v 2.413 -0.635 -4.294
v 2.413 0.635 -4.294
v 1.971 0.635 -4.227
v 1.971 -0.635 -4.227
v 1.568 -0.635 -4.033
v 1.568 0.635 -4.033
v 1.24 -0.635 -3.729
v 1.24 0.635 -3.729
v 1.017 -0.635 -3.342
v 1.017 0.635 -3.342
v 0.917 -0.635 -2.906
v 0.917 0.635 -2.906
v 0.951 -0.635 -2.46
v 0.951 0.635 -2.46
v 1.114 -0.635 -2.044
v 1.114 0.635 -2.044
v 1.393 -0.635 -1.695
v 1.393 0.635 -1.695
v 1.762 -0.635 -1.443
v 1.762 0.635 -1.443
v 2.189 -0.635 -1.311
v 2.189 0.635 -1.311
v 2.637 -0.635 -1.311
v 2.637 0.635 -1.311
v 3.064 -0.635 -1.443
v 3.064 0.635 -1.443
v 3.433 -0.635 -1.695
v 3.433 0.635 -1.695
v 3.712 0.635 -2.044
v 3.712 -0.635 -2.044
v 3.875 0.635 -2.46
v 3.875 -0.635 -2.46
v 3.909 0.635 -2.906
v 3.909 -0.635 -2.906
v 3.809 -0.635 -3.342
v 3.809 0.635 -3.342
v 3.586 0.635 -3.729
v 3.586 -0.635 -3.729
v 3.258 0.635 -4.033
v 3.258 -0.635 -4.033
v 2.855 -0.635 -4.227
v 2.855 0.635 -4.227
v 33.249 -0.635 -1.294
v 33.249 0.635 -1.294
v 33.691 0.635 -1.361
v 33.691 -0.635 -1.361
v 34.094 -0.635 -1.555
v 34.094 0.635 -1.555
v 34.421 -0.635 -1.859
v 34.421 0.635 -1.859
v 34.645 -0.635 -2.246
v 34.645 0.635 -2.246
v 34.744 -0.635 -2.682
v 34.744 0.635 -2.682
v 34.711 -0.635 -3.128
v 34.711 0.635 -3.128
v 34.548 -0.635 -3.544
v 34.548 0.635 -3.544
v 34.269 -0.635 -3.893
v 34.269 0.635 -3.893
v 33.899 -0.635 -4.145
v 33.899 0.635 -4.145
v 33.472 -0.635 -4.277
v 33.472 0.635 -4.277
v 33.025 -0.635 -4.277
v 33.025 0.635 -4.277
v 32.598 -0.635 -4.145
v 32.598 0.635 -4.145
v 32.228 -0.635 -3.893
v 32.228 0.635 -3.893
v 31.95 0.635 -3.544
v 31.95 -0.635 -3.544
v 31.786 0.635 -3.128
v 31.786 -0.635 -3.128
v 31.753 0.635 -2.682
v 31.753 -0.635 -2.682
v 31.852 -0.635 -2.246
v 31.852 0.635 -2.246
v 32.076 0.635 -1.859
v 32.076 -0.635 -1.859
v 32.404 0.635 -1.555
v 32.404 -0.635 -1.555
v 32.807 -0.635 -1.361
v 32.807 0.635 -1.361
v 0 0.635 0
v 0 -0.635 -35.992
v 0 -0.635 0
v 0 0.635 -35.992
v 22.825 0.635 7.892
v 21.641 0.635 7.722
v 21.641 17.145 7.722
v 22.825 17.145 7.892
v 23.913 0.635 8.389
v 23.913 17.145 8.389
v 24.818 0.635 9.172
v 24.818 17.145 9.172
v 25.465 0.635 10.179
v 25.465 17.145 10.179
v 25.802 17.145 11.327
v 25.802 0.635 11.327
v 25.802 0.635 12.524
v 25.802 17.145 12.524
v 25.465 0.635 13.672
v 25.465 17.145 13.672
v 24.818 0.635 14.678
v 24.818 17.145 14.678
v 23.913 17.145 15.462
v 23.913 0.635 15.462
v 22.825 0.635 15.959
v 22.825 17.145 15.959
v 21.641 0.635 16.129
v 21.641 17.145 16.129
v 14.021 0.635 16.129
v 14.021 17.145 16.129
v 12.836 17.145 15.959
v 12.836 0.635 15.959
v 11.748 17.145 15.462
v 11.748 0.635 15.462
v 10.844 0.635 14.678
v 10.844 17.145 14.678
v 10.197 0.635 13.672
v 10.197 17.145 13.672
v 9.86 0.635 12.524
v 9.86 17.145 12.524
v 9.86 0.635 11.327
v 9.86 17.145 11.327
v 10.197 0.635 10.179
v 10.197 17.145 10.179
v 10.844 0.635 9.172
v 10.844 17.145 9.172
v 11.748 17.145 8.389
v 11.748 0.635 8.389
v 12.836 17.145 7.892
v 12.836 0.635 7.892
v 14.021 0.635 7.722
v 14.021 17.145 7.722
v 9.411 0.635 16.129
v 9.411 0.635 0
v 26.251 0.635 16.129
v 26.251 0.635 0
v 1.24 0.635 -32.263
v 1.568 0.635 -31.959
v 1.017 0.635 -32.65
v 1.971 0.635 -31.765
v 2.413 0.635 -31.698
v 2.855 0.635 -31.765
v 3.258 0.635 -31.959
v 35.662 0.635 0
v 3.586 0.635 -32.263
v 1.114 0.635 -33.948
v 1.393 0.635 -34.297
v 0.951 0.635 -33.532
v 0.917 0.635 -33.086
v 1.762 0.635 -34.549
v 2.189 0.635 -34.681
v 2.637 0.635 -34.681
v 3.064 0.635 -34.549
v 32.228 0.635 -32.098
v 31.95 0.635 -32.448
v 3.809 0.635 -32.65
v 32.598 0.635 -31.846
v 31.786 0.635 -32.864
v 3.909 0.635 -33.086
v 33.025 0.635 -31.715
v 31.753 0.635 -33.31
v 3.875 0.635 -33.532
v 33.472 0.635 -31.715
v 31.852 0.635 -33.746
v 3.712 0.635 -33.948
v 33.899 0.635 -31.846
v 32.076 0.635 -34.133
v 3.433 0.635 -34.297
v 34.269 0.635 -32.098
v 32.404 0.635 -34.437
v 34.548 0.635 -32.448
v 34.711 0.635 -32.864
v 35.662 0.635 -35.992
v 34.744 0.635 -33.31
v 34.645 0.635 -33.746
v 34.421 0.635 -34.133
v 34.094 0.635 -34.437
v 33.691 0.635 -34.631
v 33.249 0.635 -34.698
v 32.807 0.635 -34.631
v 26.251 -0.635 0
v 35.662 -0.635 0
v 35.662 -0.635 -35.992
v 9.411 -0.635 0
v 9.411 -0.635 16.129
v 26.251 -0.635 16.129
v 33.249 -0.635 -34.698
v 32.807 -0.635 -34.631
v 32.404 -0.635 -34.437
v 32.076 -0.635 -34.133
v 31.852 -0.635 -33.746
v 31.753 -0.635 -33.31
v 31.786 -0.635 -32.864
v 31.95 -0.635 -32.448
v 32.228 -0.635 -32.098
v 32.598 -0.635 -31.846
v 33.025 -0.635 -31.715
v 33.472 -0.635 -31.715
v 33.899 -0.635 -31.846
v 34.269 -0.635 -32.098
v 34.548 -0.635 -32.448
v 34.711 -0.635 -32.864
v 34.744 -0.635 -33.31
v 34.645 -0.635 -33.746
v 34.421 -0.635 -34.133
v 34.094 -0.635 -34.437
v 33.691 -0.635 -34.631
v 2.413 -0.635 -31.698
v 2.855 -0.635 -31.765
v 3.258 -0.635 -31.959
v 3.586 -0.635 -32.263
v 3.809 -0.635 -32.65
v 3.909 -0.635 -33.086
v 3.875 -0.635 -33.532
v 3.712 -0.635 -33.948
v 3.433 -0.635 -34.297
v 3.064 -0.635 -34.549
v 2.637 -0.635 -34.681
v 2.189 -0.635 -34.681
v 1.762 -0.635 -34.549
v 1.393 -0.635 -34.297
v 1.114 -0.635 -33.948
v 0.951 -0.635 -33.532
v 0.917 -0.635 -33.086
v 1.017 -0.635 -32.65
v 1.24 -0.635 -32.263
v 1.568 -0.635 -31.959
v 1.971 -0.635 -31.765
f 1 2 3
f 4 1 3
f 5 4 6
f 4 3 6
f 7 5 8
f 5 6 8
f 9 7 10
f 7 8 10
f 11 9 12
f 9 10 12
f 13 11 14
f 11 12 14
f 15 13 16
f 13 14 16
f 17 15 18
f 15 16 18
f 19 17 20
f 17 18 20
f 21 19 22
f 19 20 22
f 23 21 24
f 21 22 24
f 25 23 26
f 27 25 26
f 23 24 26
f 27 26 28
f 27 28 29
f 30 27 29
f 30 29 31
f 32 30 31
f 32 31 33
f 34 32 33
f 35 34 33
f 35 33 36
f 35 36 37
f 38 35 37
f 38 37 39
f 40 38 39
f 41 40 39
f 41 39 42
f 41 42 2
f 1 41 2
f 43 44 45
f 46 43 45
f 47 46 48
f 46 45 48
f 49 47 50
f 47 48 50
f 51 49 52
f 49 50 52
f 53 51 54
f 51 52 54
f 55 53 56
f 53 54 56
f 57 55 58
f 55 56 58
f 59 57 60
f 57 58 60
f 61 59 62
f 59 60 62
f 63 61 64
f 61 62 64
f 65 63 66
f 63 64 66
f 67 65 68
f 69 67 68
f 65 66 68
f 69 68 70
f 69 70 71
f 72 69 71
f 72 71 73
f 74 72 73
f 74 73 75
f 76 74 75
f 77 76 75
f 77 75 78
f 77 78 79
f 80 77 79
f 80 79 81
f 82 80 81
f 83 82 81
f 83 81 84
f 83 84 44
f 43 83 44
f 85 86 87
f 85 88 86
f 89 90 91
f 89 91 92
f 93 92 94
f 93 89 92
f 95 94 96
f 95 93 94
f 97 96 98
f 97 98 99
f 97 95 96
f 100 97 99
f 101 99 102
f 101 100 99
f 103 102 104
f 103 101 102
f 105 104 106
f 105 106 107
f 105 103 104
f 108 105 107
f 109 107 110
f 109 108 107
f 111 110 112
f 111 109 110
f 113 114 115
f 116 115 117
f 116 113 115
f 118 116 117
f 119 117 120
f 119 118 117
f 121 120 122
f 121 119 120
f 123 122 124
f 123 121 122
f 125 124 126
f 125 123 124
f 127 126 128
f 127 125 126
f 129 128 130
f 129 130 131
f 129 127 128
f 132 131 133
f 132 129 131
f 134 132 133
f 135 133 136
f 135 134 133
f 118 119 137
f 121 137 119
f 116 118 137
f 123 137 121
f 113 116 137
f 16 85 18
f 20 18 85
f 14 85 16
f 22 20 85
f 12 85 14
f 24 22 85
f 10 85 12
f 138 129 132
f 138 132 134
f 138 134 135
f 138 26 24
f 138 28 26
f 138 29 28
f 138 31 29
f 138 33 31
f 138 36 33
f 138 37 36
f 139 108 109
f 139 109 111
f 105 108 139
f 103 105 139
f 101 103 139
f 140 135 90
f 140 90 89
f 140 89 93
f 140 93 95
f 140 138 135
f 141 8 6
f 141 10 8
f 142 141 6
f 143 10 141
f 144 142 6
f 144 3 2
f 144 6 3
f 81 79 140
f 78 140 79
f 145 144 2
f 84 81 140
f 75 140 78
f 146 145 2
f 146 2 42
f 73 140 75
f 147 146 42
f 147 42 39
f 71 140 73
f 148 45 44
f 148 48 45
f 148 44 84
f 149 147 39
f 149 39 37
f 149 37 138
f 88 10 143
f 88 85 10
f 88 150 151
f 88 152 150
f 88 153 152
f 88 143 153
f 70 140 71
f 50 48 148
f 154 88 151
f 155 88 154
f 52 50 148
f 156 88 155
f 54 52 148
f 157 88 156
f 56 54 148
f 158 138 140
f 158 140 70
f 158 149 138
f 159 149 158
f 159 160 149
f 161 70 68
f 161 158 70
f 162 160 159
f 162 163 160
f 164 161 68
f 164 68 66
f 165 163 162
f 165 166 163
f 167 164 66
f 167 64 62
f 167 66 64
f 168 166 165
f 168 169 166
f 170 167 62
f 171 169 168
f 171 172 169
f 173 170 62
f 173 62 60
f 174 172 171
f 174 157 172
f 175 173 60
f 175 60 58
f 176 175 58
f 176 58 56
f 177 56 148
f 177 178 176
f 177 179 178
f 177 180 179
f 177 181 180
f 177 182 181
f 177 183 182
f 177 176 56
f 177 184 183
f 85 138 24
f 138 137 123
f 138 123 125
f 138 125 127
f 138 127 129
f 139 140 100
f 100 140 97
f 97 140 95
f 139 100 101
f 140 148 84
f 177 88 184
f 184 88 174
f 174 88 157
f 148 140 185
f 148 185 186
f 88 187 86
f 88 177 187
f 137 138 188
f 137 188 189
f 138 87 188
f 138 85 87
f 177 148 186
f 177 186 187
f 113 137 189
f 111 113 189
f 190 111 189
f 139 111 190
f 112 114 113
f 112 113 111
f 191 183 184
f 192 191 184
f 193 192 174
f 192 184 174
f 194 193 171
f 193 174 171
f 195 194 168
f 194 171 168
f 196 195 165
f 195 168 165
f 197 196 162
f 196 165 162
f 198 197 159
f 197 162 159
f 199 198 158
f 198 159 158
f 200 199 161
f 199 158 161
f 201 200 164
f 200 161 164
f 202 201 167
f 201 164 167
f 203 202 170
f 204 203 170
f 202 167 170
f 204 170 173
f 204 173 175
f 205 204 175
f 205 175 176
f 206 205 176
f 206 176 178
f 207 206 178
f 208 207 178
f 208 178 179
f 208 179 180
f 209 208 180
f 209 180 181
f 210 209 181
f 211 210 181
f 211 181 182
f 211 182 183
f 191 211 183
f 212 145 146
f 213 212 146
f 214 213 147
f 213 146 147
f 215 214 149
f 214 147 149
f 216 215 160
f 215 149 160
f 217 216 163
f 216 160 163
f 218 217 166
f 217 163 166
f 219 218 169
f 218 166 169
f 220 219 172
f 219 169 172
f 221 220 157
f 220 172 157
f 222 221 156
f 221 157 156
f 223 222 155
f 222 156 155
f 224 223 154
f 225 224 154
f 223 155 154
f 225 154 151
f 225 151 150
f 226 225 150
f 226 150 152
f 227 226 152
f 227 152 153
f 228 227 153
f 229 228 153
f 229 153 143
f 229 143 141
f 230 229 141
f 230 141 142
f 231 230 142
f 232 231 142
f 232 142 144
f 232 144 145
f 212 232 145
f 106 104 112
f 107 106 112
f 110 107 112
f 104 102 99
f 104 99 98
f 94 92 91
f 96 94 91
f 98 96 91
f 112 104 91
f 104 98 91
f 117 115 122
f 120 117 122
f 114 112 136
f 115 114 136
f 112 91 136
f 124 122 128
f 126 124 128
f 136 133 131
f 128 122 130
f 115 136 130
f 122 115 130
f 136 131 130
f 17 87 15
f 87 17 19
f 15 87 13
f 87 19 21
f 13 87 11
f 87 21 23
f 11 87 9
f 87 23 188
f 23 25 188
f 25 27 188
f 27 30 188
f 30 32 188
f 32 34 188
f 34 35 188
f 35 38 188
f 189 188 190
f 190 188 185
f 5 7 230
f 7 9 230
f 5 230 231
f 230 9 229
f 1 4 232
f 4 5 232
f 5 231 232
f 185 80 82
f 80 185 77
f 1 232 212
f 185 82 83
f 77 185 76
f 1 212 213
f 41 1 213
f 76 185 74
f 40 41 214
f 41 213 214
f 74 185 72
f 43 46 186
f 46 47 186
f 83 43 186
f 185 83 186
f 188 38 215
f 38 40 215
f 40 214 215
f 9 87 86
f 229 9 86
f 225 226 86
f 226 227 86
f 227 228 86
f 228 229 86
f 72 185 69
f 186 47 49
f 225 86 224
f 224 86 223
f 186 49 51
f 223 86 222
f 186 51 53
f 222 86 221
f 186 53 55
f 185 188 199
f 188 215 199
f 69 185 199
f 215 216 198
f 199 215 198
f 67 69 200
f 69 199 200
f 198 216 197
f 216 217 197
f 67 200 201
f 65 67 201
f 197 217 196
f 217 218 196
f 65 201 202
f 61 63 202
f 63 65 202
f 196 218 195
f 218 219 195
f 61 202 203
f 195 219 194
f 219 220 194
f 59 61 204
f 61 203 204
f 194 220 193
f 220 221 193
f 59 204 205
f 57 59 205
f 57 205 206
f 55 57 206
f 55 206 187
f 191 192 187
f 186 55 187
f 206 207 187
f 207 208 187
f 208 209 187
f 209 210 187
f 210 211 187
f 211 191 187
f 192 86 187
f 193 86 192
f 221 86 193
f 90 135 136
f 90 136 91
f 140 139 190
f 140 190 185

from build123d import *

# Parameters (mm, degrees)
BOSS_EXTRUDE1_DEPTH = 0.635
BOSS_EXTRUDE2_DEPTH = 16.51
CUT_EXTRUDE2_REACH  = 55.289
SKETCH3_R           = 1.49987


with BuildPart() as part:
    # Sketch1 → Boss-Extrude1 (new, symmetric)
    with BuildSketch(Plane(origin=(0, 0, 0), x_dir=(1, 0, 0), z_dir=(0, 1, 0))):
        Polygon((0, 0), (9.4107, 0), (9.4107, -16.129), (26.2509, -16.129), (26.2509, 0), (35.6616, 0), (35.6616, 35.9918), (0, 35.9918), align=None)
    extrude(amount=BOSS_EXTRUDE1_DEPTH, both=True)

    # Sketch2 → Boss-Extrude2 (add)
    with BuildSketch(Plane(origin=(0, 0.635, 0), x_dir=(1, 0, 0), z_dir=(0, 1, 0))):
        with BuildLine():
            Line((14.0208, -7.7216), (21.6408, -7.7216))
            ThreePointArc((21.6408, -7.7216), (25.8445, -11.9253), (21.6408, -16.129))
            Line((21.6408, -16.129), (14.0208, -16.129))
            ThreePointArc((14.0208, -16.129), (9.8171, -11.9253), (14.0208, -7.7216))
        make_face()
    extrude(amount=BOSS_EXTRUDE2_DEPTH)

    # Sketch3 → Cut-Extrude2 (cut, up to next)
    with BuildSketch(Plane(origin=(0, 0.635, 0), x_dir=(1, 0, 0), z_dir=(0, 1, 0)), mode=Mode.PRIVATE) as cut_extrude2_sk1:
        with Locations(Location((2.413, 33.1978, 0), (0, 0, 270))):
            Circle(SKETCH3_R)
    cut_extrude2_tool1 = extrude(cut_extrude2_sk1.sketch, amount=-CUT_EXTRUDE2_REACH, mode=Mode.PRIVATE) & part.part
    # Sketch3 → Cut-Extrude2 (cut, up to next)
    with BuildSketch(Plane(origin=(0, 0.635, 0), x_dir=(1, 0, 0), z_dir=(0, 1, 0)), mode=Mode.PRIVATE) as cut_extrude2_sk2:
        with Locations(Location((2.413, 2.794, 0), (0, 0, 90))):
            Circle(SKETCH3_R)
    cut_extrude2_tool2 = extrude(cut_extrude2_sk2.sketch, amount=-CUT_EXTRUDE2_REACH, mode=Mode.PRIVATE) & part.part
    # Sketch3 → Cut-Extrude2 (cut, up to next)
    with BuildSketch(Plane(origin=(0, 0.635, 0), x_dir=(1, 0, 0), z_dir=(0, 1, 0)), mode=Mode.PRIVATE) as cut_extrude2_sk3:
        with Locations(Location((33.2486, 2.794, 0), (0, 0, 270))):
            Circle(SKETCH3_R)
    cut_extrude2_tool3 = extrude(cut_extrude2_sk3.sketch, amount=-CUT_EXTRUDE2_REACH, mode=Mode.PRIVATE) & part.part
    # Sketch3 → Cut-Extrude2 (cut, up to next)
    with BuildSketch(Plane(origin=(0, 0.635, 0), x_dir=(1, 0, 0), z_dir=(0, 1, 0)), mode=Mode.PRIVATE) as cut_extrude2_sk4:
        with Locations(Location((33.2486, 33.1978, 0), (0, 0, 90))):
            Circle(SKETCH3_R)
    cut_extrude2_tool4 = extrude(cut_extrude2_sk4.sketch, amount=-CUT_EXTRUDE2_REACH, mode=Mode.PRIVATE) & part.part
    add(cut_extrude2_tool1.solids().sort_by_distance((2.413, 0.635, -33.1978))[0], mode=Mode.SUBTRACT)
    add(cut_extrude2_tool2.solids().sort_by_distance((2.413, 0.635, -2.794))[0], mode=Mode.SUBTRACT)
    add(cut_extrude2_tool3.solids().sort_by_distance((33.2486, 0.635, -2.794))[0], mode=Mode.SUBTRACT)
    add(cut_extrude2_tool4.solids().sort_by_distance((33.2486, 0.635, -33.1978))[0], mode=Mode.SUBTRACT)


solid = part.part
